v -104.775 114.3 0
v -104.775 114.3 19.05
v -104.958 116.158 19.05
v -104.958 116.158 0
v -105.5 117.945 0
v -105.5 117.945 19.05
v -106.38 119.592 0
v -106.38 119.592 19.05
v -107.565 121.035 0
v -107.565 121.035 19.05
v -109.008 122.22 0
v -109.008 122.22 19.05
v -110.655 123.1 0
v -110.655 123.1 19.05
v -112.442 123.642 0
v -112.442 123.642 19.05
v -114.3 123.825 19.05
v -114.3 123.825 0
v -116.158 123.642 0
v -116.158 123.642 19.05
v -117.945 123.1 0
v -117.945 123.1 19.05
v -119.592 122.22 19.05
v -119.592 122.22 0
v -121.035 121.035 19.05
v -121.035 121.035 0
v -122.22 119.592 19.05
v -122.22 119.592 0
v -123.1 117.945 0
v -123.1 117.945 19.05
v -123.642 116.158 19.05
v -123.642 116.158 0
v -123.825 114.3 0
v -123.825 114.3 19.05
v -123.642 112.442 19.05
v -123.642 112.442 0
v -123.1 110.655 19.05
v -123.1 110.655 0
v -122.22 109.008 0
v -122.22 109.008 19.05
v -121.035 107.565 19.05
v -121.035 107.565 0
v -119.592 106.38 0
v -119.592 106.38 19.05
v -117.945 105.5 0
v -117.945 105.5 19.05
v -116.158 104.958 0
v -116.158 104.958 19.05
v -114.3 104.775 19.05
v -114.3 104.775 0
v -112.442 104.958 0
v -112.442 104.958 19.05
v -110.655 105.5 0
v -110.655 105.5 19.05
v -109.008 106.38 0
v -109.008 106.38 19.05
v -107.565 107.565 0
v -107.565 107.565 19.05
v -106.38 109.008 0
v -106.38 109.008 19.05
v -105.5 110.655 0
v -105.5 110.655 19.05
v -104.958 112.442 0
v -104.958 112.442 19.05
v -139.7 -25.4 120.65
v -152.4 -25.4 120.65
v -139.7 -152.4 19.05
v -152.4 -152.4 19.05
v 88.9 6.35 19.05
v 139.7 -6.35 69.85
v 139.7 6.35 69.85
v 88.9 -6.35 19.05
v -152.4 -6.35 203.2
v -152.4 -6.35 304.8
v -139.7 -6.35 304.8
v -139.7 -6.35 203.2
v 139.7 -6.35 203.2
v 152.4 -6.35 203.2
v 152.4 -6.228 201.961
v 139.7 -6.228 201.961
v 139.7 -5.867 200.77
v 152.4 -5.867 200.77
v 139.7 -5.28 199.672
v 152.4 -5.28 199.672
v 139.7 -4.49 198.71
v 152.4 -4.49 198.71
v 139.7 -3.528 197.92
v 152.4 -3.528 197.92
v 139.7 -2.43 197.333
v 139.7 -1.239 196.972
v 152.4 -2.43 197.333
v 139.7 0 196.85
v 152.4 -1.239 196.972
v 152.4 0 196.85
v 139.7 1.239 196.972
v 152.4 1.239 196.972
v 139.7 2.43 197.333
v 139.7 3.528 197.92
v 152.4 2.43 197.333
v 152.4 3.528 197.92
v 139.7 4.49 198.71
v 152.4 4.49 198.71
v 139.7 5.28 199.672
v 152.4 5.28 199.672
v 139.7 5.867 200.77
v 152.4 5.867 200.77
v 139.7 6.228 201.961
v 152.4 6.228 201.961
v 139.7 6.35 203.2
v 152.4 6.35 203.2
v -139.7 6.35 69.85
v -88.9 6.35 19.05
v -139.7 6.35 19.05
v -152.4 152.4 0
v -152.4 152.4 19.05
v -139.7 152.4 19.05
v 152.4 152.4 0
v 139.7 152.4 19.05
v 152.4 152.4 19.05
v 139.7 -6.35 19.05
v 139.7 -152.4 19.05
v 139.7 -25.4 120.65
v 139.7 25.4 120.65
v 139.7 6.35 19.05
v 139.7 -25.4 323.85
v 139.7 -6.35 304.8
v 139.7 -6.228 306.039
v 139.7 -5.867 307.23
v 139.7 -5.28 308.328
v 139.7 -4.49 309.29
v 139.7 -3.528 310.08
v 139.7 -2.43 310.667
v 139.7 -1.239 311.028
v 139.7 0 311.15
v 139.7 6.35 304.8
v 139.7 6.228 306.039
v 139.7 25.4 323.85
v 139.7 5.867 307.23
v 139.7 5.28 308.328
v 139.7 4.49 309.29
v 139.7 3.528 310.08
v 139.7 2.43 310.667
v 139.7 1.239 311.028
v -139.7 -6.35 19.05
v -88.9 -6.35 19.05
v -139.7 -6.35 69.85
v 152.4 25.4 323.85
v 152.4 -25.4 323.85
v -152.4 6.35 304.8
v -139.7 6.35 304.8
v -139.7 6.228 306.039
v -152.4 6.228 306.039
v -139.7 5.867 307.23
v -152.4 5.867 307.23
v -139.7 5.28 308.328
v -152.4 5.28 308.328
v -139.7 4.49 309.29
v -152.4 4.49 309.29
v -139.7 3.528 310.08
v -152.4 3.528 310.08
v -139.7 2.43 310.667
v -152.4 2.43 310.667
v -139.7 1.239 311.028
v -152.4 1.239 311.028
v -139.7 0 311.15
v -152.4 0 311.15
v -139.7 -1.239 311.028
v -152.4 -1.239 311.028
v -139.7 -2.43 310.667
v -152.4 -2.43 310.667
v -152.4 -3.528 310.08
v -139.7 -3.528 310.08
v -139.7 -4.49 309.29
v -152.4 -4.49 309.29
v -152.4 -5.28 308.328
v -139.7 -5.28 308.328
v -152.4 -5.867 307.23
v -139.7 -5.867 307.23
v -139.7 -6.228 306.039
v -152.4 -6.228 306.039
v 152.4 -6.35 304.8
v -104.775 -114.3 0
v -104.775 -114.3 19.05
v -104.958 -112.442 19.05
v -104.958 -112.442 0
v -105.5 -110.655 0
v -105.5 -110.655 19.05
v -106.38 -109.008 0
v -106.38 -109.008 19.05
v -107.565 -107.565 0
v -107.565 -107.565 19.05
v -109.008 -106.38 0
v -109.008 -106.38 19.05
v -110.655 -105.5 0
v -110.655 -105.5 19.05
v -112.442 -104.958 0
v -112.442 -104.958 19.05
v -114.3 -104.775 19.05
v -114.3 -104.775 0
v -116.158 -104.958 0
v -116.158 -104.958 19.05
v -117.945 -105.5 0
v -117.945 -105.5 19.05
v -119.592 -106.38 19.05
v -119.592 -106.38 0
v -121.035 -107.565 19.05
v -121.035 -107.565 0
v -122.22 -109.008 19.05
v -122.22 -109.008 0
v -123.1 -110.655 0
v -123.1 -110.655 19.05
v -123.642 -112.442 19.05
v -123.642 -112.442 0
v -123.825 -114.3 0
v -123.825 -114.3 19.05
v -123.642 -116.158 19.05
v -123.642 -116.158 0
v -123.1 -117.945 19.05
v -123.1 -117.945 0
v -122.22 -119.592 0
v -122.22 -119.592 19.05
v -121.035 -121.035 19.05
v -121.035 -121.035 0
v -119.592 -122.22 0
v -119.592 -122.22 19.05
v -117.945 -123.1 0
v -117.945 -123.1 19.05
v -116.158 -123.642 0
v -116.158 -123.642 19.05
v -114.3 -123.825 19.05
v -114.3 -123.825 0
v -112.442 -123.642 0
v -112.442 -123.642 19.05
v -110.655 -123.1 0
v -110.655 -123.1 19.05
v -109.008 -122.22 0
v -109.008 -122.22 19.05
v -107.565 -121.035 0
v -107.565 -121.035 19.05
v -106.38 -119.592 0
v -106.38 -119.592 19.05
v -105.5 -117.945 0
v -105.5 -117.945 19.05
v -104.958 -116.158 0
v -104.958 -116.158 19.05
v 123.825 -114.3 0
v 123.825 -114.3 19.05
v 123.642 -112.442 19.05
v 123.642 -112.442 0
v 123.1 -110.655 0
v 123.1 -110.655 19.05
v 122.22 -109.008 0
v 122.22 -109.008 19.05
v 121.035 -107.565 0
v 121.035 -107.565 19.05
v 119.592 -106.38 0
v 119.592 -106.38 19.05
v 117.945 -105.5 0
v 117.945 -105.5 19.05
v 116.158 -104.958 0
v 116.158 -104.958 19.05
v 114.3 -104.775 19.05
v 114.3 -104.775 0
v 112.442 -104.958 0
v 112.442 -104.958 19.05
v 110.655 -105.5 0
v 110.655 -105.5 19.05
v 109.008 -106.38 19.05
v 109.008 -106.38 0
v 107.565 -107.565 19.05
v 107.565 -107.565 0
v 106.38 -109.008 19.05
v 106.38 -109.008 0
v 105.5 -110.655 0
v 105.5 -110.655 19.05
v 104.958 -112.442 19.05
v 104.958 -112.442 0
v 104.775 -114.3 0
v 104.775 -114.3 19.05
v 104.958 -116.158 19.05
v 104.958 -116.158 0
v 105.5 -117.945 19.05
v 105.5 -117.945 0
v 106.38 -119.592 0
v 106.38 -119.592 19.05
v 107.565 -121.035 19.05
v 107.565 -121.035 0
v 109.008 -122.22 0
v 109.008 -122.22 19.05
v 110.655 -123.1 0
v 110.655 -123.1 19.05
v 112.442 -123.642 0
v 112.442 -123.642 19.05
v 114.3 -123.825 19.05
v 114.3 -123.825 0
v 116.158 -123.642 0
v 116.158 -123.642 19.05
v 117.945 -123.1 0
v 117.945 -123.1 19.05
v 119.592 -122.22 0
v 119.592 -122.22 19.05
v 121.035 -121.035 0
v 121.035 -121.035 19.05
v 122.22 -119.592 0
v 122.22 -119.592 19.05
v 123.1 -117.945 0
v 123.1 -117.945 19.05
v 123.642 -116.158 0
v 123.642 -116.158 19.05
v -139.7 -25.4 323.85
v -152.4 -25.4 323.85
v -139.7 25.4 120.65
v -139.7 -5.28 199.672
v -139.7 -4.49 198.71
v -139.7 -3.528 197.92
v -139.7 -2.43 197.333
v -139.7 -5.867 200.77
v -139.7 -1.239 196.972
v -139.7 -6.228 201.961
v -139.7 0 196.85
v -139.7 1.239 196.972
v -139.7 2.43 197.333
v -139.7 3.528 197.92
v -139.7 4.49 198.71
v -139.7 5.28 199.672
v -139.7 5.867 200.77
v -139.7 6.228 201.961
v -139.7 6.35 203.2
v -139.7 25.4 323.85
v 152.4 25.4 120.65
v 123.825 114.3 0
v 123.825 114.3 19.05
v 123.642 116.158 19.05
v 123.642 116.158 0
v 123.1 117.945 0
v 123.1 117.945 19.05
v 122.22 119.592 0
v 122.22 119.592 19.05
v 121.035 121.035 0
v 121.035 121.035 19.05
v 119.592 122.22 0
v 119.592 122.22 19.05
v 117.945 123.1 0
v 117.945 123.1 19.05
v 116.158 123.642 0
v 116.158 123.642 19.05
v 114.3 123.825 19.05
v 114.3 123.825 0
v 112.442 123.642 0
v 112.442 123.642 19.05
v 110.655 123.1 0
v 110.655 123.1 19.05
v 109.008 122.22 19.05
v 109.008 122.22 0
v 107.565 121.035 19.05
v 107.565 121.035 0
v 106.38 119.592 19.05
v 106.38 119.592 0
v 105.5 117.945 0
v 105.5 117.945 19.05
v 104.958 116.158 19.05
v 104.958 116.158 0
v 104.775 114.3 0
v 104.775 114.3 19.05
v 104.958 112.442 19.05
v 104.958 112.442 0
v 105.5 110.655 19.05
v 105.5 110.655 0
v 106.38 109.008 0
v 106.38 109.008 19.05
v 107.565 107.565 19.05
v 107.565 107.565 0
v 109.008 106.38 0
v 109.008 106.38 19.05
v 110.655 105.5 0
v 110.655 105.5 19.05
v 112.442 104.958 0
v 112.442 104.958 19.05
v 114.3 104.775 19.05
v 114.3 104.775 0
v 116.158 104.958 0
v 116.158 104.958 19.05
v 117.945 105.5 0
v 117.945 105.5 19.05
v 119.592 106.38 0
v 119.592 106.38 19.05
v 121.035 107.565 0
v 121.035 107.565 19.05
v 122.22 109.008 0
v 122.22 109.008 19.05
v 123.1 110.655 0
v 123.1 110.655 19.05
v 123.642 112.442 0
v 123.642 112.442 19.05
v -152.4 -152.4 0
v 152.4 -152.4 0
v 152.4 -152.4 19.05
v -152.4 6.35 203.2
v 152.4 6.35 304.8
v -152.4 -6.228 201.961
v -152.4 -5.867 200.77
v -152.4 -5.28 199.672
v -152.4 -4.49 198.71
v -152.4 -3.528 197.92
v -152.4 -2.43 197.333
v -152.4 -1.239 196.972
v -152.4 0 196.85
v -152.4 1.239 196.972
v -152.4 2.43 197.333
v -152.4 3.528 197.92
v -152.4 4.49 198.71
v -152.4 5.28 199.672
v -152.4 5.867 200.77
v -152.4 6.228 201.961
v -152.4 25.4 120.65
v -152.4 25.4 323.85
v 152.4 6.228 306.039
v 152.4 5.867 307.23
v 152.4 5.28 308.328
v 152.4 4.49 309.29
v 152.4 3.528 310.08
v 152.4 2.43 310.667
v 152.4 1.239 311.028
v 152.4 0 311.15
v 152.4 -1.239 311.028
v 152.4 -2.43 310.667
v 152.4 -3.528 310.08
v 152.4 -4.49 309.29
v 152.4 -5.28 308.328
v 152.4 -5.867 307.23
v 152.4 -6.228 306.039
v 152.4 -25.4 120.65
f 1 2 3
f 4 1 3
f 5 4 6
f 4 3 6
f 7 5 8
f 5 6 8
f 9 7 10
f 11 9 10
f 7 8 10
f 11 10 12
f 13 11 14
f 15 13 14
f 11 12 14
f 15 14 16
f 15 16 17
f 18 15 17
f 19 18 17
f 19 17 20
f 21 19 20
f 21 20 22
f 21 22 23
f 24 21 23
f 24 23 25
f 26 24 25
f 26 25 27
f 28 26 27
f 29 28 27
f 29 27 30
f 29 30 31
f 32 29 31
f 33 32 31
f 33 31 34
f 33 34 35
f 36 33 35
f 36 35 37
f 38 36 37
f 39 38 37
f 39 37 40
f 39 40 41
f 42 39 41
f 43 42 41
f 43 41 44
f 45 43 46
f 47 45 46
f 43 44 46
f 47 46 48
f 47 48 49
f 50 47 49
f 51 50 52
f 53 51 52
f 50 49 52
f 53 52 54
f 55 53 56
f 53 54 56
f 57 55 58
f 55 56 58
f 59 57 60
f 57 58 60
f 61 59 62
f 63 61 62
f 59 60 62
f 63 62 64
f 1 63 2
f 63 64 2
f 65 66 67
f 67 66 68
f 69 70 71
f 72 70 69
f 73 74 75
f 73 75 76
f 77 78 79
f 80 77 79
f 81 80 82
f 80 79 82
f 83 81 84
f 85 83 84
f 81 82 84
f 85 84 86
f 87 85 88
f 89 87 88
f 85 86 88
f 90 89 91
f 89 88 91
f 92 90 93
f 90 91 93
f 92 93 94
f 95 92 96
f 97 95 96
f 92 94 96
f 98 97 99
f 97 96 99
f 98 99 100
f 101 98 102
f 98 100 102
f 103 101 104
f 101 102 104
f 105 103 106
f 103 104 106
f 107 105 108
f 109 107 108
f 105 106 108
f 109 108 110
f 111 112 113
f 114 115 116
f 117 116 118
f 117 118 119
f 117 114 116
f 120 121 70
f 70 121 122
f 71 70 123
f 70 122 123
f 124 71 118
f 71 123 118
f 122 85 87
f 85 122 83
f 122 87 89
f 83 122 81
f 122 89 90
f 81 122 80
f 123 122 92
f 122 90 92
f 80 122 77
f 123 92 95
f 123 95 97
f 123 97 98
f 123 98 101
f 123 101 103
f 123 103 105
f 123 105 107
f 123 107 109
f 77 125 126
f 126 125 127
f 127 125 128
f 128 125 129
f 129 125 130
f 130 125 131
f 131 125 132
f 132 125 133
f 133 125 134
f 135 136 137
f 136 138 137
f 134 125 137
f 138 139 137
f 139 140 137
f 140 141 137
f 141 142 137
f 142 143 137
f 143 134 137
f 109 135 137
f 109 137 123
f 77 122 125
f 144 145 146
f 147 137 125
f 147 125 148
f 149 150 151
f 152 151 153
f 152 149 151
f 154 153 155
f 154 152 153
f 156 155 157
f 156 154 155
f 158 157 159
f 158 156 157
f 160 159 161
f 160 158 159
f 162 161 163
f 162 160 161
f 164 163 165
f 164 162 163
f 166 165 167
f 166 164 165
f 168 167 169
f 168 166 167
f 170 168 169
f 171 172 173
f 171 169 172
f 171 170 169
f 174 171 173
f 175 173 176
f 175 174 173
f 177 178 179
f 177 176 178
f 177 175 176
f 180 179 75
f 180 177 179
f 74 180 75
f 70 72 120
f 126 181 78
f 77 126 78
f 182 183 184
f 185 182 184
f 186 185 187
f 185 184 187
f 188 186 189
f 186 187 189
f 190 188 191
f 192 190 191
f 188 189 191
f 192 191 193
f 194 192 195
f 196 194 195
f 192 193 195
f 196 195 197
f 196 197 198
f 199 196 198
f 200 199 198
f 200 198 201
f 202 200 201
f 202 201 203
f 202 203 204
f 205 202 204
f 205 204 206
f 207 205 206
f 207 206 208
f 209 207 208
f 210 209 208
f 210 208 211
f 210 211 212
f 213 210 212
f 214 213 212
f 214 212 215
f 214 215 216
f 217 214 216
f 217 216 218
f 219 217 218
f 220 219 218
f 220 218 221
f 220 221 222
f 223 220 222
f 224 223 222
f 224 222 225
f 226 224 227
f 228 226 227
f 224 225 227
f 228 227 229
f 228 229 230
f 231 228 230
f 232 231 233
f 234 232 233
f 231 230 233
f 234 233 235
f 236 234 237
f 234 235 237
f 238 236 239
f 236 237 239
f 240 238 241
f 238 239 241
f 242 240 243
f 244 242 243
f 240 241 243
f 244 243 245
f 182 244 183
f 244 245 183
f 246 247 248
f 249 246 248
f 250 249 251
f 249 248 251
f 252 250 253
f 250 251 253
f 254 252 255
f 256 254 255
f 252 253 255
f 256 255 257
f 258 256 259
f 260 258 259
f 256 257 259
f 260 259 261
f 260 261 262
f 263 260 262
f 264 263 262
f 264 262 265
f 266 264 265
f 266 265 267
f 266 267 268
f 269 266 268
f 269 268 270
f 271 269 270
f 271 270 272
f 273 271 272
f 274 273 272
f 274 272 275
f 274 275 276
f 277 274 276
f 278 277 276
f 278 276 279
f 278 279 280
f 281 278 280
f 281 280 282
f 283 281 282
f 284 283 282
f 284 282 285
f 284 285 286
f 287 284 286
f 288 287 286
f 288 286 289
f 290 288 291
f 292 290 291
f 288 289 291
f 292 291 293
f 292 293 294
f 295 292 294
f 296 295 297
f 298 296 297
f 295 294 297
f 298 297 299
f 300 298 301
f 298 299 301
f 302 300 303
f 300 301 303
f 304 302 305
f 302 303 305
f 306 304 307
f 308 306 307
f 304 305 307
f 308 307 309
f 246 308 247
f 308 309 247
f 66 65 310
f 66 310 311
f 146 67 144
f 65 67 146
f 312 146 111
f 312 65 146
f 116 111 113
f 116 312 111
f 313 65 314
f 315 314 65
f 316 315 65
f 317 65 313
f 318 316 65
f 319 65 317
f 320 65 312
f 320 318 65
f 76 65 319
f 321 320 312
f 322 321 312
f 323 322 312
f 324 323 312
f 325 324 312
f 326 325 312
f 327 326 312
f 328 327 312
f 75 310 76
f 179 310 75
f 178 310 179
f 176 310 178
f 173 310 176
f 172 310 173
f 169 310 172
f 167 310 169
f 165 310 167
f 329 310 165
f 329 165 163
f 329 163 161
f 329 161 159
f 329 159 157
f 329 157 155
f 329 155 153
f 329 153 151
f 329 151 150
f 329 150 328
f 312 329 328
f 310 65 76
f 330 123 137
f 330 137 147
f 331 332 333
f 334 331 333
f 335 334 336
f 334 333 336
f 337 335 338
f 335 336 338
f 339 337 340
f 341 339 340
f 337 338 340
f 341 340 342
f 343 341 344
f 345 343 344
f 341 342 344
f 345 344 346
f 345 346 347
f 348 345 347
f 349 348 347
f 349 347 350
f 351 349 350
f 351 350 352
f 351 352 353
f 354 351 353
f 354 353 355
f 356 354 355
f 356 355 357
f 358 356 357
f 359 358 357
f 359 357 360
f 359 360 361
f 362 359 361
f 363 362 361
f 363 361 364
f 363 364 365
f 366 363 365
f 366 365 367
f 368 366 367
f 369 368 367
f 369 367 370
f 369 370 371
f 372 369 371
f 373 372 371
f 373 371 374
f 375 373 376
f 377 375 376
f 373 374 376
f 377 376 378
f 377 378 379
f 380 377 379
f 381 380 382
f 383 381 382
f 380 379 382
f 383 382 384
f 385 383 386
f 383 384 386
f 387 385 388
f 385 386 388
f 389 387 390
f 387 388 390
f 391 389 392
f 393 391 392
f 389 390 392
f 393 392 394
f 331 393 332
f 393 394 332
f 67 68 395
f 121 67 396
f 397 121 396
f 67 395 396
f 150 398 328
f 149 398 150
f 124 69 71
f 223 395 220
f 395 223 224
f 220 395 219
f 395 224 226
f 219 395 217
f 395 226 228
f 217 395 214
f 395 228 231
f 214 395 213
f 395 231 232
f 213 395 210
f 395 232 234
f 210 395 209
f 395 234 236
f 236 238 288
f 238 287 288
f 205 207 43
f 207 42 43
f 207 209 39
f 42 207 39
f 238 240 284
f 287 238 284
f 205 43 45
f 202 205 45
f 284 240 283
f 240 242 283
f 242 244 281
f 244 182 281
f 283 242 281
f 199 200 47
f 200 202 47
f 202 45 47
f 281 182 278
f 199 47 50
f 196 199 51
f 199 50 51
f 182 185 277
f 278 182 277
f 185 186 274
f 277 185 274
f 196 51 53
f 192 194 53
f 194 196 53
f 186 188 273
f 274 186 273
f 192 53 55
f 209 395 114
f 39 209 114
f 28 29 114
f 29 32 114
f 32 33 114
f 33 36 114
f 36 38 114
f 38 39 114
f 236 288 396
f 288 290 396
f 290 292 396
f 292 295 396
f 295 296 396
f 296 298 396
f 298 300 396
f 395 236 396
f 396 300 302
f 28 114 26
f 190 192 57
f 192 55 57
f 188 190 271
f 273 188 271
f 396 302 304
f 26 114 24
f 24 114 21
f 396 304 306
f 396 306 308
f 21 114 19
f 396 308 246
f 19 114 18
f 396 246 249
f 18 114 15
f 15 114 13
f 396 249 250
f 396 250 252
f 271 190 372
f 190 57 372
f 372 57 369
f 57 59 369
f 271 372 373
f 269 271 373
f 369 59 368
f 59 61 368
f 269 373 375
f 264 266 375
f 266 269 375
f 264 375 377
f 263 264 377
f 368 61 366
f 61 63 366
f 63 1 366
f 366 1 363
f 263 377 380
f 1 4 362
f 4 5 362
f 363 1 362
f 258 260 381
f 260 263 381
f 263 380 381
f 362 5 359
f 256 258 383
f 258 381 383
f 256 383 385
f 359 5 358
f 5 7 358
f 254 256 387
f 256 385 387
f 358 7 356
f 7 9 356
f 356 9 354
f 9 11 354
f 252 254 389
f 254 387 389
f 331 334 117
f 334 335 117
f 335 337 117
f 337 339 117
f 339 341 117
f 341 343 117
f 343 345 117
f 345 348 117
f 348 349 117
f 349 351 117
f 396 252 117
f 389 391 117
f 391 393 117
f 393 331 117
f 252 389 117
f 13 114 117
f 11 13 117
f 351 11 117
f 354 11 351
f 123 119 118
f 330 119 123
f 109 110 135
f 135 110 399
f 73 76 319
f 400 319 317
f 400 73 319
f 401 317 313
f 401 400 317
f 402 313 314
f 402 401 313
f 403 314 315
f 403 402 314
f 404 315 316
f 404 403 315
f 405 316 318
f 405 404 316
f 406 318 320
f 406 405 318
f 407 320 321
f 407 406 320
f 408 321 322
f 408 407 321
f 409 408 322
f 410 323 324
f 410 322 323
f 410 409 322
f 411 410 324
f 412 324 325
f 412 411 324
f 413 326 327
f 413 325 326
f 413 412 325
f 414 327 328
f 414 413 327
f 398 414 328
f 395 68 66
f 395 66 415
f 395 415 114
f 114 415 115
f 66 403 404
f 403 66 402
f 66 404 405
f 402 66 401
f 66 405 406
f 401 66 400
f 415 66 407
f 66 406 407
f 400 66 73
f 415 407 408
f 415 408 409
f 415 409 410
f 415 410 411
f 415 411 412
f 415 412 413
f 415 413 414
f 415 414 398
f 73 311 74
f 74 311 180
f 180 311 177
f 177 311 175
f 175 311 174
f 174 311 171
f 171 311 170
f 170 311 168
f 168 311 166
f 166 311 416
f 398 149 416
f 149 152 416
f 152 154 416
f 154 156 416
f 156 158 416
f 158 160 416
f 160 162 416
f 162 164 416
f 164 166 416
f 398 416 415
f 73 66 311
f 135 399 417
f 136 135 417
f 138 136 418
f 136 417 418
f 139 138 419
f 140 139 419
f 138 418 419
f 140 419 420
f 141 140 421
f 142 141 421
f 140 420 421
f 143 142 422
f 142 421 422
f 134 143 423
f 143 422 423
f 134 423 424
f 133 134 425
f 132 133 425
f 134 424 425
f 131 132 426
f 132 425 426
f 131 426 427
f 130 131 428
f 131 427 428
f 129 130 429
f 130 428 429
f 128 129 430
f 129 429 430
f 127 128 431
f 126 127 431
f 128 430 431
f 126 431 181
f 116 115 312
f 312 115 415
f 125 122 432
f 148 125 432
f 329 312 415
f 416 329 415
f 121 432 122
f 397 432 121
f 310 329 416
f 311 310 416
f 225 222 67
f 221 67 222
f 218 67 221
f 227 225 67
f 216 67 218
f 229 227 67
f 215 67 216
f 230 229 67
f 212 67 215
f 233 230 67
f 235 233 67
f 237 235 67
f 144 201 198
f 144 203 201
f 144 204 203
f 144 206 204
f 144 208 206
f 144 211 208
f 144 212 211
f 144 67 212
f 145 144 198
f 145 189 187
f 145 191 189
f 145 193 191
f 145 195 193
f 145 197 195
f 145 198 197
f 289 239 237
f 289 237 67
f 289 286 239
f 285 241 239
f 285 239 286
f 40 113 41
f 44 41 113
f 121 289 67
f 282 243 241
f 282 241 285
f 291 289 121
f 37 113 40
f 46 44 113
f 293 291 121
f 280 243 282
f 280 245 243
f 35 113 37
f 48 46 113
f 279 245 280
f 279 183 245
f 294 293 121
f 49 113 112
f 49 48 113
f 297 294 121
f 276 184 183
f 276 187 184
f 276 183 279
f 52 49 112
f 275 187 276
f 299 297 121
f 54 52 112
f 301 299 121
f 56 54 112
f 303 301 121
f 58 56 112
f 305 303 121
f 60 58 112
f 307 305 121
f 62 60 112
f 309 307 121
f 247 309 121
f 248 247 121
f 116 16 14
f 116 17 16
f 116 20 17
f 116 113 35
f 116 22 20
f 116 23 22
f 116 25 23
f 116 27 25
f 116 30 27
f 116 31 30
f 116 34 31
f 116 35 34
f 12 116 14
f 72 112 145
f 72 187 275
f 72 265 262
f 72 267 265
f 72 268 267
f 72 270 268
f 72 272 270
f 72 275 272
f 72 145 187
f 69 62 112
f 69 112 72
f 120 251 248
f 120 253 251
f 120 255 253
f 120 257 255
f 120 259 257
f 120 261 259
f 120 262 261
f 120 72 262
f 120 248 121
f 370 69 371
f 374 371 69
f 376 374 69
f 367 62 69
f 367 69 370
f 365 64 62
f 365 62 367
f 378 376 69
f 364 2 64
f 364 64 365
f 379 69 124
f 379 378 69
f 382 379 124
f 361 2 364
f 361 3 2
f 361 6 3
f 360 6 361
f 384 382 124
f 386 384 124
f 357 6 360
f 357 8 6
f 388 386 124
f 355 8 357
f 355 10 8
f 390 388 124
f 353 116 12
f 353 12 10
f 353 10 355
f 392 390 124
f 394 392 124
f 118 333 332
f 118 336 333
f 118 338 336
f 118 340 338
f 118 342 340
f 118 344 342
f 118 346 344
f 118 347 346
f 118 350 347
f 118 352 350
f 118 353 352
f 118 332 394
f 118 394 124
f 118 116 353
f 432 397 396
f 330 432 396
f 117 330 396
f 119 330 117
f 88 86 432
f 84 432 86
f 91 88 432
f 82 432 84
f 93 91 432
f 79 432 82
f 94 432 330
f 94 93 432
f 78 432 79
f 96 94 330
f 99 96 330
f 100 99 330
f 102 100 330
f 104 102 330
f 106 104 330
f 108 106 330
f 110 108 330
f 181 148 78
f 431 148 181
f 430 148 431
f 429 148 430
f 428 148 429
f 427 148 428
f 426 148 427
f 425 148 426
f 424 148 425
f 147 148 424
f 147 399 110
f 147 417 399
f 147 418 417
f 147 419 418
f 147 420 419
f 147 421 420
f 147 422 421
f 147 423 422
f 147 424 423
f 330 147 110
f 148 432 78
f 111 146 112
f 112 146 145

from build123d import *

# Parameters (mm, degrees)
F0_W      = 304.8
F0_H      = 304.8
F1_DEPTH  = 19.05
F2_W      = 12.7
F2_H      = 50.8
F3_DEPTH  = 304.8
F5_DEPTH  = 25.4
F7_DEPTH  = 6.35
F9_DEPTH  = 12.7
F10_R     = 9.525
F11_DEPTH = 25.4


# Not quite as in the source:
# - a pattern or mirror of a feature is missing from the dataset's text; its kind, count and spacing are read off the source's solid


with BuildPart() as f1:
    # F0 (on Top) → F1 (new body)
    with BuildSketch(Plane.XY):
        Rectangle(F0_W, F0_H)
    extrude(amount=F1_DEPTH)

    # F2 (on face) → F3 (join)
    with BuildSketch(Plane.XY.offset(19.05)):
        with Locations((146.05, 0)):
            Rectangle(F2_W, F2_H)
    f3 = extrude(amount=F3_DEPTH)

    # F3_copies: F3 across plane
    add(f3.mirror(Plane(origin=(0, 0, 0), x_dir=(0, 0, -1), z_dir=(-1, 0, 0))))

    # F4 (on face) → F5 (cut)
    with BuildSketch(Plane.YZ.offset(152.4)):
        with BuildLine():
            Line((6.35, 203.2), (6.35, 304.8))
            ThreePointArc((6.35, 304.8), (0, 311.15), (-6.35, 304.8))
            Line((-6.35, 304.8), (-6.35, 203.2))
            ThreePointArc((-6.35, 203.2), (0, 196.85), (6.35, 203.2))
        make_face()
    f5 = extrude(amount=-F5_DEPTH, mode=Mode.SUBTRACT)

    # F5_copies: F5 across plane
    add(f5.mirror(Plane(origin=(0, 0, 0), x_dir=(0, 0, -1), z_dir=(-1, 0, 0))), mode=Mode.SUBTRACT)

    # F6 (on Front) → F7 (join, symmetric)
    with BuildSketch(Plane.XZ):
        Polygon((139.7, 19.05), (139.7, 69.85), (88.9, 19.05), align=None)
    f7 = extrude(amount=F7_DEPTH, both=True)

    # F7_copies: F7 across plane
    add(f7.mirror(Plane(origin=(0, 0, 0), x_dir=(0, 0, -1), z_dir=(-1, 0, 0))))

    # F8 (on face) → F9 (join)
    with BuildSketch(Plane.YZ.offset(152.4)):
        Polygon((-25.4, 120.65), (-152.4, 19.05), (-25.4, 19.05), align=None)
        Polygon((152.4, 19.05), (25.4, 120.65), (25.4, 19.05), align=None)
    f9 = extrude(amount=-F9_DEPTH)

    # F9_copies: F9 across plane
    add(f9.mirror(Plane(origin=(0, 0, 0), x_dir=(0, 0, -1), z_dir=(-1, 0, 0))))

    # F10 (on face) → F11 (cut)
    with BuildSketch(Plane.XY.offset(19.05)):
        with Locations((-114.3, 114.3)):
            Circle(F10_R)
        with Locations((114.3, 114.3)):
            Circle(F10_R)
        with Locations((114.3, -114.3)):
            Circle(F10_R)
        with Locations((-114.3, -114.3)):
            Circle(F10_R)
    extrude(amount=-F11_DEPTH, mode=Mode.SUBTRACT)


solid = f1.part
